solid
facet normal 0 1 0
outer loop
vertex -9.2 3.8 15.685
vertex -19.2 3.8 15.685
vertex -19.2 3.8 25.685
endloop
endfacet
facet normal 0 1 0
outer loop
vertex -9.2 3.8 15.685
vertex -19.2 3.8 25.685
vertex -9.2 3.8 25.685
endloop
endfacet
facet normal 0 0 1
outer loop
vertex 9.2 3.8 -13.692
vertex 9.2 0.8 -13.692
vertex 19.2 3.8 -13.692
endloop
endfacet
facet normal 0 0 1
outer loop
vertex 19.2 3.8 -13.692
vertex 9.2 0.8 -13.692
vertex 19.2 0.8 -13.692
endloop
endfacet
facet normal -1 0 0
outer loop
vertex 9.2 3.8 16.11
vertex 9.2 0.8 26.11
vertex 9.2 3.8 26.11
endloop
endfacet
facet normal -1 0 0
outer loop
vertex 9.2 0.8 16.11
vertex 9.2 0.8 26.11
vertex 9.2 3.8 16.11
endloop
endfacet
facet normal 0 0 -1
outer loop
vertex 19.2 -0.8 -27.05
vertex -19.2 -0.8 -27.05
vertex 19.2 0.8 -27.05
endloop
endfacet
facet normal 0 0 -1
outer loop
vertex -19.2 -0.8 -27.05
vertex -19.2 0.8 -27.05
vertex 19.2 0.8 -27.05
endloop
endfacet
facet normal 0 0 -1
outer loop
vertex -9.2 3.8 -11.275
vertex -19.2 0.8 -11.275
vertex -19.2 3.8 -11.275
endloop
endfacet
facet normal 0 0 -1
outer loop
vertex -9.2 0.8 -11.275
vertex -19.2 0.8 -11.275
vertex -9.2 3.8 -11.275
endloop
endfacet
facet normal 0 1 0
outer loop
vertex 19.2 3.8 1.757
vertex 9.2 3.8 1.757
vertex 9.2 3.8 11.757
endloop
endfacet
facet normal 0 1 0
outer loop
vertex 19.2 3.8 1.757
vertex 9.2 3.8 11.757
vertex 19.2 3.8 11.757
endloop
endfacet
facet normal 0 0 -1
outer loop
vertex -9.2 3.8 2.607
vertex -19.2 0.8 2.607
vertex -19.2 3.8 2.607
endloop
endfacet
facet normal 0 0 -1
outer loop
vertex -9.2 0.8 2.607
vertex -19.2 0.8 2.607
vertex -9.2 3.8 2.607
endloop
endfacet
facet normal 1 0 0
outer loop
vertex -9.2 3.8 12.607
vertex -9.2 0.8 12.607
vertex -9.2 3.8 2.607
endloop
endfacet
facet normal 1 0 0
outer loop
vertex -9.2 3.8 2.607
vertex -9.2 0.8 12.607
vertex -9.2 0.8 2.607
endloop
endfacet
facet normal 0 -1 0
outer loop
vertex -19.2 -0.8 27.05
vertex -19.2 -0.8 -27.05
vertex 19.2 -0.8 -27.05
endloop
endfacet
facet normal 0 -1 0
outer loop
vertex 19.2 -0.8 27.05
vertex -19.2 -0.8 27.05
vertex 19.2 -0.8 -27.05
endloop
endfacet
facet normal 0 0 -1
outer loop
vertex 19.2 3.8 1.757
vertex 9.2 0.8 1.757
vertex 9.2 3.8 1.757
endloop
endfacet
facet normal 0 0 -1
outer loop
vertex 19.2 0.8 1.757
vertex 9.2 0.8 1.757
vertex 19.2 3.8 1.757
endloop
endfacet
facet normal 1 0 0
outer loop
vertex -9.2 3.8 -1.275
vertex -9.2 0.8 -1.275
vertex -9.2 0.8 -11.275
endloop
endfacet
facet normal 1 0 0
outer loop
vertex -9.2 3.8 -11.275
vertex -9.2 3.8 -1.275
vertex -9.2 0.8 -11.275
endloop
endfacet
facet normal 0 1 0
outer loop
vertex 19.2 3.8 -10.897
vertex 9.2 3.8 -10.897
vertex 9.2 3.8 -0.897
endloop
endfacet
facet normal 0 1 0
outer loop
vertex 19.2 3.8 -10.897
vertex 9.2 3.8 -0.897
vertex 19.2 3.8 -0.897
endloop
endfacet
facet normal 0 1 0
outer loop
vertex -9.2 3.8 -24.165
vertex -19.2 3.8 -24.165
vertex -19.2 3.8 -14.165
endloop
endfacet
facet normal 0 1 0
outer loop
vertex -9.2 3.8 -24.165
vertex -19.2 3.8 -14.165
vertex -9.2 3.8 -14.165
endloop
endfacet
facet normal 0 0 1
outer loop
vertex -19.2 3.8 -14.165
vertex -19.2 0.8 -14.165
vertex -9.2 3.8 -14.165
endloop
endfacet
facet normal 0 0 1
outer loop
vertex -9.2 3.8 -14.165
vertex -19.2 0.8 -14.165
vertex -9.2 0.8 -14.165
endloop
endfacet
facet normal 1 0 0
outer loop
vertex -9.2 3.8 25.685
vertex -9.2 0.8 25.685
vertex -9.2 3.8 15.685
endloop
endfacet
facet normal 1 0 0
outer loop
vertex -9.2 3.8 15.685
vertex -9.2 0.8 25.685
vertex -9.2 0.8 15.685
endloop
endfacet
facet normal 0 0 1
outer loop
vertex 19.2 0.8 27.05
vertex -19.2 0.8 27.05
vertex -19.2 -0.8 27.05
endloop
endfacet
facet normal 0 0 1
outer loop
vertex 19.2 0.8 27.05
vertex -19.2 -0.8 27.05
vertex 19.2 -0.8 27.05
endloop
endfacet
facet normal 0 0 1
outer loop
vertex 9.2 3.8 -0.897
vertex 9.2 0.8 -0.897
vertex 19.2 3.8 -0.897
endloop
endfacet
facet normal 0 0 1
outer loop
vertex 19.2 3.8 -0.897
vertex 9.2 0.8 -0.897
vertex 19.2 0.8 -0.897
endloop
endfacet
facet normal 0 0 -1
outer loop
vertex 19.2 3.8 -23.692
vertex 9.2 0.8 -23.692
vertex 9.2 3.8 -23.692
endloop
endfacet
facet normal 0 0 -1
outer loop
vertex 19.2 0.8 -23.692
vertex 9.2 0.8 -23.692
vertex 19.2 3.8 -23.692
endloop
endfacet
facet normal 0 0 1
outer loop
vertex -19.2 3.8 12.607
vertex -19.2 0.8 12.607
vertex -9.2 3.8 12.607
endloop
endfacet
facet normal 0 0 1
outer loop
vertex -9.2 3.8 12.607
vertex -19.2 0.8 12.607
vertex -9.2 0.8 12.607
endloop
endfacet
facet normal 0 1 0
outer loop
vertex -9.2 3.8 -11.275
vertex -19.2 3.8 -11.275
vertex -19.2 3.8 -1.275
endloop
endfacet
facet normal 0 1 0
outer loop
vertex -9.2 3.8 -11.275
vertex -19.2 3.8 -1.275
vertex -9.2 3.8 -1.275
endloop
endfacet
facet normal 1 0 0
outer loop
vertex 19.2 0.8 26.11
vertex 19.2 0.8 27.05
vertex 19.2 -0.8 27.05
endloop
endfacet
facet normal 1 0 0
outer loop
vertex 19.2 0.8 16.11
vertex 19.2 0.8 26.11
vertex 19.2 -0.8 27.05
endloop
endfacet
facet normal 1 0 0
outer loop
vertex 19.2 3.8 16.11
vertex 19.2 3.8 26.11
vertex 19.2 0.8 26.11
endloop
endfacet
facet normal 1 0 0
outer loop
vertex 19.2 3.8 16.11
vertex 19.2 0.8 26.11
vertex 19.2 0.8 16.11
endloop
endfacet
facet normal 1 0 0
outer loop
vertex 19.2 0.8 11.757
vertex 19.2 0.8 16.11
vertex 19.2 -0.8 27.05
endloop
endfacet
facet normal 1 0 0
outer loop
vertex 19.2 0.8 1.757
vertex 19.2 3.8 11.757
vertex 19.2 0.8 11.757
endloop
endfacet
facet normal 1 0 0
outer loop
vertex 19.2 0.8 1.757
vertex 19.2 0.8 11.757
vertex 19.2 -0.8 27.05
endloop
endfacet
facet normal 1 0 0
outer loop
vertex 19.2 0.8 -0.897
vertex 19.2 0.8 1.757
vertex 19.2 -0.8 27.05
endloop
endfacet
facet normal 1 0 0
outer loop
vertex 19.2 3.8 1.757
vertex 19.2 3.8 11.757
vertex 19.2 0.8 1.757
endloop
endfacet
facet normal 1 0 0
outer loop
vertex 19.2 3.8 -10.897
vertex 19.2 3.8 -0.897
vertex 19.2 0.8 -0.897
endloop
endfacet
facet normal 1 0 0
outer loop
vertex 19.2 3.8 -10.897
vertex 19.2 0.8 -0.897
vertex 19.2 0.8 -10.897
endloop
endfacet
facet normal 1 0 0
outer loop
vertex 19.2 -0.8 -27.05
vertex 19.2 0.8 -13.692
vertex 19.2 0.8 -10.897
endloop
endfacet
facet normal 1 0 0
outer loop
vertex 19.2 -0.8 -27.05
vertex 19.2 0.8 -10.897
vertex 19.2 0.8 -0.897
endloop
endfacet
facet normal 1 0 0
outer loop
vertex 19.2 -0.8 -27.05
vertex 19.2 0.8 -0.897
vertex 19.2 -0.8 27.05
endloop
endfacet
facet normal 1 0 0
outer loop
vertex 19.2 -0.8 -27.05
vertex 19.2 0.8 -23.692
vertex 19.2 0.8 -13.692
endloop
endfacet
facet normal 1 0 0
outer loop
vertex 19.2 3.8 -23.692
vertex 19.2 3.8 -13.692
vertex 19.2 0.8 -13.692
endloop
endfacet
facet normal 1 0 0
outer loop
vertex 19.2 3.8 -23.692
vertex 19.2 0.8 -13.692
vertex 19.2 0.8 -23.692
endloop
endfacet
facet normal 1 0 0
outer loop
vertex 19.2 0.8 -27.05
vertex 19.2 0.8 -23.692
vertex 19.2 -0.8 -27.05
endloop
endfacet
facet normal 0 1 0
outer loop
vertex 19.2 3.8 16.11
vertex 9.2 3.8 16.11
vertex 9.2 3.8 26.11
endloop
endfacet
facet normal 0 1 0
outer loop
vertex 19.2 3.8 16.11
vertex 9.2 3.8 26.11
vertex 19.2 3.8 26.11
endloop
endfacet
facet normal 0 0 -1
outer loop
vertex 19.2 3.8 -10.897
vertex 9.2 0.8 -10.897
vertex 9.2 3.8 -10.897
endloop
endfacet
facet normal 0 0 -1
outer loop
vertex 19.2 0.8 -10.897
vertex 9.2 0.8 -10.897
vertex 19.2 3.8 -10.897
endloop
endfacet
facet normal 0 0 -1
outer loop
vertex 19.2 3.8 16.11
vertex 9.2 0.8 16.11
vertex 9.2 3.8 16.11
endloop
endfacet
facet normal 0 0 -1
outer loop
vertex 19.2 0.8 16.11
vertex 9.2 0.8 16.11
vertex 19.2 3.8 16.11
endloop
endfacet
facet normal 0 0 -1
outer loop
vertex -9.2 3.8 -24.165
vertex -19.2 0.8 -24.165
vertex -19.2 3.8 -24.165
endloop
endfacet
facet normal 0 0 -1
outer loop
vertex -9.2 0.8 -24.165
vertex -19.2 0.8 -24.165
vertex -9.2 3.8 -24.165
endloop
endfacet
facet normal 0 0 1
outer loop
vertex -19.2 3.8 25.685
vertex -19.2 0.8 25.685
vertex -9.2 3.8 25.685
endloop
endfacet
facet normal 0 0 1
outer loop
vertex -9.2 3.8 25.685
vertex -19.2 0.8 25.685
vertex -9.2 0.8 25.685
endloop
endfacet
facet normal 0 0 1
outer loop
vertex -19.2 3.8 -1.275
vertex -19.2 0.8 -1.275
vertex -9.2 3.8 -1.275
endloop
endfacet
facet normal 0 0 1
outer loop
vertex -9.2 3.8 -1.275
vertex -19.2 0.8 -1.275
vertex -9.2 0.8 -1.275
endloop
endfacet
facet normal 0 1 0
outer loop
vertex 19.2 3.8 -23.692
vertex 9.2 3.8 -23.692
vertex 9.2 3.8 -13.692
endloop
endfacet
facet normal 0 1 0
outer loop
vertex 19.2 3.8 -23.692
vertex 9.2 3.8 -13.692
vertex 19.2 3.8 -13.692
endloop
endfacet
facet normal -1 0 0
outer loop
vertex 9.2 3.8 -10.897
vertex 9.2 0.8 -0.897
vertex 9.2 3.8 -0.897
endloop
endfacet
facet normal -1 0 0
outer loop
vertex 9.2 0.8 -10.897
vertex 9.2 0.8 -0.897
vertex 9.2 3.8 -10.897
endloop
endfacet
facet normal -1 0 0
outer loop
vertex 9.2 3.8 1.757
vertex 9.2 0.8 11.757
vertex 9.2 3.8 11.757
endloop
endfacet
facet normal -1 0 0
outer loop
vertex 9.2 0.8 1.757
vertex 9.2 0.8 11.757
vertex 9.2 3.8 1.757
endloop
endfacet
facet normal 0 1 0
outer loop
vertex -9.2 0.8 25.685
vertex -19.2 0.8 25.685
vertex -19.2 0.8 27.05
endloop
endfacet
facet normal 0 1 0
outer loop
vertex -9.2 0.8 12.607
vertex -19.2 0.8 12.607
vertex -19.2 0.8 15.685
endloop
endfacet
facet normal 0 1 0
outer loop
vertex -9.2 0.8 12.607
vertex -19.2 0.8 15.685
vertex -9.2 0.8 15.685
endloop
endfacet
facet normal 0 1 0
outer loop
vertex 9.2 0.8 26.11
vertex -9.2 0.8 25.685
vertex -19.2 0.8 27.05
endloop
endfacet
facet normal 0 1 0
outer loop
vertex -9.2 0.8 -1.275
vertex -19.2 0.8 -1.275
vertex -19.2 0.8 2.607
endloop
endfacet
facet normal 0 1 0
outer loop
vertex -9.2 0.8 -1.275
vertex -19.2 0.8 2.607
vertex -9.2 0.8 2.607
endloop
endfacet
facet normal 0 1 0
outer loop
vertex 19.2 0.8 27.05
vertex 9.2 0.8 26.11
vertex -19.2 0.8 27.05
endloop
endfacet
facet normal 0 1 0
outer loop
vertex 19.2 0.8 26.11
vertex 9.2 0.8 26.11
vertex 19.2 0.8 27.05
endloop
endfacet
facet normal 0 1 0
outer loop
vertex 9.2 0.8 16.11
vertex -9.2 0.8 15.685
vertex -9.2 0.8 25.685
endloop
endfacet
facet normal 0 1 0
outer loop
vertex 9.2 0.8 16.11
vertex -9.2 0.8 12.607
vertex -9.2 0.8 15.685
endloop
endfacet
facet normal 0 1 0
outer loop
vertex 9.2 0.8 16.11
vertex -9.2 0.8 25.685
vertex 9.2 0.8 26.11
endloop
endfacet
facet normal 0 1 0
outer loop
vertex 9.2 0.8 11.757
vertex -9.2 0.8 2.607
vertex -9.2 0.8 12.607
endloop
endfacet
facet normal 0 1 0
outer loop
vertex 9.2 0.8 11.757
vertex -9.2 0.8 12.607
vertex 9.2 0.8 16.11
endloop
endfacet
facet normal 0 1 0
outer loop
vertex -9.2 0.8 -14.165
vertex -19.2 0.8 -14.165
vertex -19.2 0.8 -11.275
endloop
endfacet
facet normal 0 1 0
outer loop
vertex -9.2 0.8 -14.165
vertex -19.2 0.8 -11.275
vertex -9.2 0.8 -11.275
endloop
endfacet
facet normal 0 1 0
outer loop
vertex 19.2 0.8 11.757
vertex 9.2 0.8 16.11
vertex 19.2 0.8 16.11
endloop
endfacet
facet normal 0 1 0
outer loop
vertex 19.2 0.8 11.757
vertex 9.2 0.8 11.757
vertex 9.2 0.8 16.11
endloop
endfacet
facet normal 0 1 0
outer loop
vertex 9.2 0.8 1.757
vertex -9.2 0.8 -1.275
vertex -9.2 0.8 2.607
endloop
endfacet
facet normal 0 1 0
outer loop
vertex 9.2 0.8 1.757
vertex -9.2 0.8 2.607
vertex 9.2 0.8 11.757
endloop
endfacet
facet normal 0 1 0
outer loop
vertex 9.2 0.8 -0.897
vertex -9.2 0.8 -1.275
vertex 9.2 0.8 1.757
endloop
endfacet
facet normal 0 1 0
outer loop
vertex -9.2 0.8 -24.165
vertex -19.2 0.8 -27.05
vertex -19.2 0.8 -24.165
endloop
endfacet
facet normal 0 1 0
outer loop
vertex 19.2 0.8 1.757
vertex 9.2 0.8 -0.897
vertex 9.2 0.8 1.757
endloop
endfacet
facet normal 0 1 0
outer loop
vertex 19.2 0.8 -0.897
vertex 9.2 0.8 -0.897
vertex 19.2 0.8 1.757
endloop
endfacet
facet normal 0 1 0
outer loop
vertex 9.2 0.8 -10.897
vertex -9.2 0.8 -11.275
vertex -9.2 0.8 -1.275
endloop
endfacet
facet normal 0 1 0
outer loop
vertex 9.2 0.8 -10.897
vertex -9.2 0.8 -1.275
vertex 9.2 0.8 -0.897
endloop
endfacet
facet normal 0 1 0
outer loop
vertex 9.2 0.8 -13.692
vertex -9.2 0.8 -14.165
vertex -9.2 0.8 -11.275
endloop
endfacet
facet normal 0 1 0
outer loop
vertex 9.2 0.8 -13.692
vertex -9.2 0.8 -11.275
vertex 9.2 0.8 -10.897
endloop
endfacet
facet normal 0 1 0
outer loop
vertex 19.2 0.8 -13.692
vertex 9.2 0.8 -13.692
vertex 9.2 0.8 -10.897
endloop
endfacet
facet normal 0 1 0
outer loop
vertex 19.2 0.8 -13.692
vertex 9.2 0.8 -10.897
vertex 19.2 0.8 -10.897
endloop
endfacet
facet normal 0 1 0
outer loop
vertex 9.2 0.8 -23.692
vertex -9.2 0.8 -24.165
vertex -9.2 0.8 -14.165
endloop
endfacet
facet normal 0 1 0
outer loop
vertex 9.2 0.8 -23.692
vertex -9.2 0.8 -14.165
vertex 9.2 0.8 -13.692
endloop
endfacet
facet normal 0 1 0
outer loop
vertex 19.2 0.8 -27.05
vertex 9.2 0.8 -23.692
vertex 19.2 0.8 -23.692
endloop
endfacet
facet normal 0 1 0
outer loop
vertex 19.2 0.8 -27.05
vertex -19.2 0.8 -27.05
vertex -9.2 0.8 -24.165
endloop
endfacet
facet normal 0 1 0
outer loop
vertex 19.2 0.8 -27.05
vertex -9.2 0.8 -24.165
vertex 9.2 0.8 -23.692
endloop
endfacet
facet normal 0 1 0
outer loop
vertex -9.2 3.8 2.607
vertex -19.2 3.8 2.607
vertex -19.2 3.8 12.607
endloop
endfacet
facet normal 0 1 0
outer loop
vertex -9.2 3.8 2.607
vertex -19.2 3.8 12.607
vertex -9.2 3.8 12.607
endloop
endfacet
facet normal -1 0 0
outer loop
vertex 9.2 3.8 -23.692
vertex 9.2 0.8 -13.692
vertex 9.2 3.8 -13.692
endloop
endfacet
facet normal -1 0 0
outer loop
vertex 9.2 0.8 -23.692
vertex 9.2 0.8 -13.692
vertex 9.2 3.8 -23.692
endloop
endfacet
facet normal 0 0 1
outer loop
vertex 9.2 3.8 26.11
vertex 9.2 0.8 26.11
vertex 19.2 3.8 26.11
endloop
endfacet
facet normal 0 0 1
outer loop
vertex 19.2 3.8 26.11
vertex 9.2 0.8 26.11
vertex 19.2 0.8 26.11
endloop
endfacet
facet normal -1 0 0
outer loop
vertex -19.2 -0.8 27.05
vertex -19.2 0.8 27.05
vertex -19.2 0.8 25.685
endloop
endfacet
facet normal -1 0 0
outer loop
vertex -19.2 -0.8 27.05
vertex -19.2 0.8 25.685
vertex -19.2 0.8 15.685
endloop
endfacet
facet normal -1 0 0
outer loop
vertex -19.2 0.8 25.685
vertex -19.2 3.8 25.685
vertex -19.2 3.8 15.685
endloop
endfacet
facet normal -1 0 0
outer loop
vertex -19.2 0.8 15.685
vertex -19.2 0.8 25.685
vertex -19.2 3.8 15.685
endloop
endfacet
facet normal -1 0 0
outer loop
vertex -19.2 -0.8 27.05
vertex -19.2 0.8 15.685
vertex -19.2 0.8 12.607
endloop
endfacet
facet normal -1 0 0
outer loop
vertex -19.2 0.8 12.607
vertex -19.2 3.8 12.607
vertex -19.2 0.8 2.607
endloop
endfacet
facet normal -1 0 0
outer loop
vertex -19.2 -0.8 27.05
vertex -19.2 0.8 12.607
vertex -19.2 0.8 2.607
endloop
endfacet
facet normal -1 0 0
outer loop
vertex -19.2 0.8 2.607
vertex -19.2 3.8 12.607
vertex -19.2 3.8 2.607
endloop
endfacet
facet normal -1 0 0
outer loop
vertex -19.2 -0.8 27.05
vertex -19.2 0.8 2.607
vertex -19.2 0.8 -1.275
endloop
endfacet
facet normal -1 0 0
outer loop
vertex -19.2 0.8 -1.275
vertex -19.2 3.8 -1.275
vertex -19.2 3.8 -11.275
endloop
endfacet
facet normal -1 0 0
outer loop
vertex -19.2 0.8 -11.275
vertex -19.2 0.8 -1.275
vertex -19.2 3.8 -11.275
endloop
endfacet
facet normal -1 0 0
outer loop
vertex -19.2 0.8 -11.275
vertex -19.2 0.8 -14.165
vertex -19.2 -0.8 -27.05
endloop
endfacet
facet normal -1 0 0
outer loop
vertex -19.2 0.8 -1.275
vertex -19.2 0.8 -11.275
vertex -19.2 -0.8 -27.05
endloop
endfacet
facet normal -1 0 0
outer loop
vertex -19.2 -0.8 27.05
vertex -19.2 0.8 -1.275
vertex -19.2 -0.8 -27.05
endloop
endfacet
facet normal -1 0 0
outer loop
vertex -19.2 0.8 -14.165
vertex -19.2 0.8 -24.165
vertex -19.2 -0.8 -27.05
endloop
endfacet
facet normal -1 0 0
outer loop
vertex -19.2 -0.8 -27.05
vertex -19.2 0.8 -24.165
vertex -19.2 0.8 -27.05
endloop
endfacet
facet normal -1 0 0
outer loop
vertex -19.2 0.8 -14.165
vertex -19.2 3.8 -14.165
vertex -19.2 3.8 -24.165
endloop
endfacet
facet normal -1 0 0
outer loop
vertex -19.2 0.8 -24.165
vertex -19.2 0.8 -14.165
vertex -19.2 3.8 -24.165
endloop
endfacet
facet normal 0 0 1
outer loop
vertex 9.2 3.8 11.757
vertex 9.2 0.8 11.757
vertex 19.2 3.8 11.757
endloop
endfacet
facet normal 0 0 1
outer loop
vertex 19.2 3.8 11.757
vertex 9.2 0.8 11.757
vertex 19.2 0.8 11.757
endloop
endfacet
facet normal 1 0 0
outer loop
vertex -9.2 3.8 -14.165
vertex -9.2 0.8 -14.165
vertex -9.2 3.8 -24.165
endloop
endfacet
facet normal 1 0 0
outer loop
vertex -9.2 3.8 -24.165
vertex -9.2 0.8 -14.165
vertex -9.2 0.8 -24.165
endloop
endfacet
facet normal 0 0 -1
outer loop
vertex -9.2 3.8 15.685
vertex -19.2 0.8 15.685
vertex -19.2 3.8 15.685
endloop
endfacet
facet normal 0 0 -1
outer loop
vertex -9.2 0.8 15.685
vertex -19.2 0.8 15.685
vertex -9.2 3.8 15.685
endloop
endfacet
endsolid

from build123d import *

# Parameters (mm, degrees)
SKETCH_1_W      = 38.4
SKETCH_1_H      = 54.1
EXTRUDE_1_DEPTH = 0.8
SKETCH_2_W      = 10
SKETCH_2_H      = 10
EXTRUDE_2_DEPTH = 3


with BuildPart() as part:
    # Эскиз1 → Бобышка-Вытянуть1 (new, symmetric)
    with BuildSketch(Plane(origin=(0, 0, 0), x_dir=(1, 0, 0), z_dir=(0, 1, 0))):
        Rectangle(SKETCH_1_W, SKETCH_1_H)
    extrude(amount=EXTRUDE_1_DEPTH, both=True)

    # Эскиз2 → Бобышка-Вытянуть2 (add)
    with BuildSketch(Plane(origin=(0, 0.8, 0), x_dir=(1, 0, 0), z_dir=(0, 1, 0))):
        with Locations((-14.2, 19.164621175)):
            Rectangle(SKETCH_2_W, SKETCH_2_H)
        with Locations((-14.2, 6.274815906)):
            Rectangle(SKETCH_2_W, SKETCH_2_H)
        with Locations((-14.2, -7.606512846)):
            Rectangle(SKETCH_2_W, SKETCH_2_H)
        with Locations((-14.2, -20.685179731)):
            Rectangle(SKETCH_2_W, SKETCH_2_H)
        with Locations((14.2, 18.692467136)):
            Rectangle(SKETCH_2_W, SKETCH_2_H)
        with Locations((14.2, 5.897092674)):
            Rectangle(SKETCH_2_W, SKETCH_2_H)
        with Locations((14.2, -6.756635575)):
            Rectangle(SKETCH_2_W, SKETCH_2_H)
        with Locations((14.2, -21.110118366)):
            Rectangle(SKETCH_2_W, SKETCH_2_H)
    extrude(amount=EXTRUDE_2_DEPTH)


solid = part.part
